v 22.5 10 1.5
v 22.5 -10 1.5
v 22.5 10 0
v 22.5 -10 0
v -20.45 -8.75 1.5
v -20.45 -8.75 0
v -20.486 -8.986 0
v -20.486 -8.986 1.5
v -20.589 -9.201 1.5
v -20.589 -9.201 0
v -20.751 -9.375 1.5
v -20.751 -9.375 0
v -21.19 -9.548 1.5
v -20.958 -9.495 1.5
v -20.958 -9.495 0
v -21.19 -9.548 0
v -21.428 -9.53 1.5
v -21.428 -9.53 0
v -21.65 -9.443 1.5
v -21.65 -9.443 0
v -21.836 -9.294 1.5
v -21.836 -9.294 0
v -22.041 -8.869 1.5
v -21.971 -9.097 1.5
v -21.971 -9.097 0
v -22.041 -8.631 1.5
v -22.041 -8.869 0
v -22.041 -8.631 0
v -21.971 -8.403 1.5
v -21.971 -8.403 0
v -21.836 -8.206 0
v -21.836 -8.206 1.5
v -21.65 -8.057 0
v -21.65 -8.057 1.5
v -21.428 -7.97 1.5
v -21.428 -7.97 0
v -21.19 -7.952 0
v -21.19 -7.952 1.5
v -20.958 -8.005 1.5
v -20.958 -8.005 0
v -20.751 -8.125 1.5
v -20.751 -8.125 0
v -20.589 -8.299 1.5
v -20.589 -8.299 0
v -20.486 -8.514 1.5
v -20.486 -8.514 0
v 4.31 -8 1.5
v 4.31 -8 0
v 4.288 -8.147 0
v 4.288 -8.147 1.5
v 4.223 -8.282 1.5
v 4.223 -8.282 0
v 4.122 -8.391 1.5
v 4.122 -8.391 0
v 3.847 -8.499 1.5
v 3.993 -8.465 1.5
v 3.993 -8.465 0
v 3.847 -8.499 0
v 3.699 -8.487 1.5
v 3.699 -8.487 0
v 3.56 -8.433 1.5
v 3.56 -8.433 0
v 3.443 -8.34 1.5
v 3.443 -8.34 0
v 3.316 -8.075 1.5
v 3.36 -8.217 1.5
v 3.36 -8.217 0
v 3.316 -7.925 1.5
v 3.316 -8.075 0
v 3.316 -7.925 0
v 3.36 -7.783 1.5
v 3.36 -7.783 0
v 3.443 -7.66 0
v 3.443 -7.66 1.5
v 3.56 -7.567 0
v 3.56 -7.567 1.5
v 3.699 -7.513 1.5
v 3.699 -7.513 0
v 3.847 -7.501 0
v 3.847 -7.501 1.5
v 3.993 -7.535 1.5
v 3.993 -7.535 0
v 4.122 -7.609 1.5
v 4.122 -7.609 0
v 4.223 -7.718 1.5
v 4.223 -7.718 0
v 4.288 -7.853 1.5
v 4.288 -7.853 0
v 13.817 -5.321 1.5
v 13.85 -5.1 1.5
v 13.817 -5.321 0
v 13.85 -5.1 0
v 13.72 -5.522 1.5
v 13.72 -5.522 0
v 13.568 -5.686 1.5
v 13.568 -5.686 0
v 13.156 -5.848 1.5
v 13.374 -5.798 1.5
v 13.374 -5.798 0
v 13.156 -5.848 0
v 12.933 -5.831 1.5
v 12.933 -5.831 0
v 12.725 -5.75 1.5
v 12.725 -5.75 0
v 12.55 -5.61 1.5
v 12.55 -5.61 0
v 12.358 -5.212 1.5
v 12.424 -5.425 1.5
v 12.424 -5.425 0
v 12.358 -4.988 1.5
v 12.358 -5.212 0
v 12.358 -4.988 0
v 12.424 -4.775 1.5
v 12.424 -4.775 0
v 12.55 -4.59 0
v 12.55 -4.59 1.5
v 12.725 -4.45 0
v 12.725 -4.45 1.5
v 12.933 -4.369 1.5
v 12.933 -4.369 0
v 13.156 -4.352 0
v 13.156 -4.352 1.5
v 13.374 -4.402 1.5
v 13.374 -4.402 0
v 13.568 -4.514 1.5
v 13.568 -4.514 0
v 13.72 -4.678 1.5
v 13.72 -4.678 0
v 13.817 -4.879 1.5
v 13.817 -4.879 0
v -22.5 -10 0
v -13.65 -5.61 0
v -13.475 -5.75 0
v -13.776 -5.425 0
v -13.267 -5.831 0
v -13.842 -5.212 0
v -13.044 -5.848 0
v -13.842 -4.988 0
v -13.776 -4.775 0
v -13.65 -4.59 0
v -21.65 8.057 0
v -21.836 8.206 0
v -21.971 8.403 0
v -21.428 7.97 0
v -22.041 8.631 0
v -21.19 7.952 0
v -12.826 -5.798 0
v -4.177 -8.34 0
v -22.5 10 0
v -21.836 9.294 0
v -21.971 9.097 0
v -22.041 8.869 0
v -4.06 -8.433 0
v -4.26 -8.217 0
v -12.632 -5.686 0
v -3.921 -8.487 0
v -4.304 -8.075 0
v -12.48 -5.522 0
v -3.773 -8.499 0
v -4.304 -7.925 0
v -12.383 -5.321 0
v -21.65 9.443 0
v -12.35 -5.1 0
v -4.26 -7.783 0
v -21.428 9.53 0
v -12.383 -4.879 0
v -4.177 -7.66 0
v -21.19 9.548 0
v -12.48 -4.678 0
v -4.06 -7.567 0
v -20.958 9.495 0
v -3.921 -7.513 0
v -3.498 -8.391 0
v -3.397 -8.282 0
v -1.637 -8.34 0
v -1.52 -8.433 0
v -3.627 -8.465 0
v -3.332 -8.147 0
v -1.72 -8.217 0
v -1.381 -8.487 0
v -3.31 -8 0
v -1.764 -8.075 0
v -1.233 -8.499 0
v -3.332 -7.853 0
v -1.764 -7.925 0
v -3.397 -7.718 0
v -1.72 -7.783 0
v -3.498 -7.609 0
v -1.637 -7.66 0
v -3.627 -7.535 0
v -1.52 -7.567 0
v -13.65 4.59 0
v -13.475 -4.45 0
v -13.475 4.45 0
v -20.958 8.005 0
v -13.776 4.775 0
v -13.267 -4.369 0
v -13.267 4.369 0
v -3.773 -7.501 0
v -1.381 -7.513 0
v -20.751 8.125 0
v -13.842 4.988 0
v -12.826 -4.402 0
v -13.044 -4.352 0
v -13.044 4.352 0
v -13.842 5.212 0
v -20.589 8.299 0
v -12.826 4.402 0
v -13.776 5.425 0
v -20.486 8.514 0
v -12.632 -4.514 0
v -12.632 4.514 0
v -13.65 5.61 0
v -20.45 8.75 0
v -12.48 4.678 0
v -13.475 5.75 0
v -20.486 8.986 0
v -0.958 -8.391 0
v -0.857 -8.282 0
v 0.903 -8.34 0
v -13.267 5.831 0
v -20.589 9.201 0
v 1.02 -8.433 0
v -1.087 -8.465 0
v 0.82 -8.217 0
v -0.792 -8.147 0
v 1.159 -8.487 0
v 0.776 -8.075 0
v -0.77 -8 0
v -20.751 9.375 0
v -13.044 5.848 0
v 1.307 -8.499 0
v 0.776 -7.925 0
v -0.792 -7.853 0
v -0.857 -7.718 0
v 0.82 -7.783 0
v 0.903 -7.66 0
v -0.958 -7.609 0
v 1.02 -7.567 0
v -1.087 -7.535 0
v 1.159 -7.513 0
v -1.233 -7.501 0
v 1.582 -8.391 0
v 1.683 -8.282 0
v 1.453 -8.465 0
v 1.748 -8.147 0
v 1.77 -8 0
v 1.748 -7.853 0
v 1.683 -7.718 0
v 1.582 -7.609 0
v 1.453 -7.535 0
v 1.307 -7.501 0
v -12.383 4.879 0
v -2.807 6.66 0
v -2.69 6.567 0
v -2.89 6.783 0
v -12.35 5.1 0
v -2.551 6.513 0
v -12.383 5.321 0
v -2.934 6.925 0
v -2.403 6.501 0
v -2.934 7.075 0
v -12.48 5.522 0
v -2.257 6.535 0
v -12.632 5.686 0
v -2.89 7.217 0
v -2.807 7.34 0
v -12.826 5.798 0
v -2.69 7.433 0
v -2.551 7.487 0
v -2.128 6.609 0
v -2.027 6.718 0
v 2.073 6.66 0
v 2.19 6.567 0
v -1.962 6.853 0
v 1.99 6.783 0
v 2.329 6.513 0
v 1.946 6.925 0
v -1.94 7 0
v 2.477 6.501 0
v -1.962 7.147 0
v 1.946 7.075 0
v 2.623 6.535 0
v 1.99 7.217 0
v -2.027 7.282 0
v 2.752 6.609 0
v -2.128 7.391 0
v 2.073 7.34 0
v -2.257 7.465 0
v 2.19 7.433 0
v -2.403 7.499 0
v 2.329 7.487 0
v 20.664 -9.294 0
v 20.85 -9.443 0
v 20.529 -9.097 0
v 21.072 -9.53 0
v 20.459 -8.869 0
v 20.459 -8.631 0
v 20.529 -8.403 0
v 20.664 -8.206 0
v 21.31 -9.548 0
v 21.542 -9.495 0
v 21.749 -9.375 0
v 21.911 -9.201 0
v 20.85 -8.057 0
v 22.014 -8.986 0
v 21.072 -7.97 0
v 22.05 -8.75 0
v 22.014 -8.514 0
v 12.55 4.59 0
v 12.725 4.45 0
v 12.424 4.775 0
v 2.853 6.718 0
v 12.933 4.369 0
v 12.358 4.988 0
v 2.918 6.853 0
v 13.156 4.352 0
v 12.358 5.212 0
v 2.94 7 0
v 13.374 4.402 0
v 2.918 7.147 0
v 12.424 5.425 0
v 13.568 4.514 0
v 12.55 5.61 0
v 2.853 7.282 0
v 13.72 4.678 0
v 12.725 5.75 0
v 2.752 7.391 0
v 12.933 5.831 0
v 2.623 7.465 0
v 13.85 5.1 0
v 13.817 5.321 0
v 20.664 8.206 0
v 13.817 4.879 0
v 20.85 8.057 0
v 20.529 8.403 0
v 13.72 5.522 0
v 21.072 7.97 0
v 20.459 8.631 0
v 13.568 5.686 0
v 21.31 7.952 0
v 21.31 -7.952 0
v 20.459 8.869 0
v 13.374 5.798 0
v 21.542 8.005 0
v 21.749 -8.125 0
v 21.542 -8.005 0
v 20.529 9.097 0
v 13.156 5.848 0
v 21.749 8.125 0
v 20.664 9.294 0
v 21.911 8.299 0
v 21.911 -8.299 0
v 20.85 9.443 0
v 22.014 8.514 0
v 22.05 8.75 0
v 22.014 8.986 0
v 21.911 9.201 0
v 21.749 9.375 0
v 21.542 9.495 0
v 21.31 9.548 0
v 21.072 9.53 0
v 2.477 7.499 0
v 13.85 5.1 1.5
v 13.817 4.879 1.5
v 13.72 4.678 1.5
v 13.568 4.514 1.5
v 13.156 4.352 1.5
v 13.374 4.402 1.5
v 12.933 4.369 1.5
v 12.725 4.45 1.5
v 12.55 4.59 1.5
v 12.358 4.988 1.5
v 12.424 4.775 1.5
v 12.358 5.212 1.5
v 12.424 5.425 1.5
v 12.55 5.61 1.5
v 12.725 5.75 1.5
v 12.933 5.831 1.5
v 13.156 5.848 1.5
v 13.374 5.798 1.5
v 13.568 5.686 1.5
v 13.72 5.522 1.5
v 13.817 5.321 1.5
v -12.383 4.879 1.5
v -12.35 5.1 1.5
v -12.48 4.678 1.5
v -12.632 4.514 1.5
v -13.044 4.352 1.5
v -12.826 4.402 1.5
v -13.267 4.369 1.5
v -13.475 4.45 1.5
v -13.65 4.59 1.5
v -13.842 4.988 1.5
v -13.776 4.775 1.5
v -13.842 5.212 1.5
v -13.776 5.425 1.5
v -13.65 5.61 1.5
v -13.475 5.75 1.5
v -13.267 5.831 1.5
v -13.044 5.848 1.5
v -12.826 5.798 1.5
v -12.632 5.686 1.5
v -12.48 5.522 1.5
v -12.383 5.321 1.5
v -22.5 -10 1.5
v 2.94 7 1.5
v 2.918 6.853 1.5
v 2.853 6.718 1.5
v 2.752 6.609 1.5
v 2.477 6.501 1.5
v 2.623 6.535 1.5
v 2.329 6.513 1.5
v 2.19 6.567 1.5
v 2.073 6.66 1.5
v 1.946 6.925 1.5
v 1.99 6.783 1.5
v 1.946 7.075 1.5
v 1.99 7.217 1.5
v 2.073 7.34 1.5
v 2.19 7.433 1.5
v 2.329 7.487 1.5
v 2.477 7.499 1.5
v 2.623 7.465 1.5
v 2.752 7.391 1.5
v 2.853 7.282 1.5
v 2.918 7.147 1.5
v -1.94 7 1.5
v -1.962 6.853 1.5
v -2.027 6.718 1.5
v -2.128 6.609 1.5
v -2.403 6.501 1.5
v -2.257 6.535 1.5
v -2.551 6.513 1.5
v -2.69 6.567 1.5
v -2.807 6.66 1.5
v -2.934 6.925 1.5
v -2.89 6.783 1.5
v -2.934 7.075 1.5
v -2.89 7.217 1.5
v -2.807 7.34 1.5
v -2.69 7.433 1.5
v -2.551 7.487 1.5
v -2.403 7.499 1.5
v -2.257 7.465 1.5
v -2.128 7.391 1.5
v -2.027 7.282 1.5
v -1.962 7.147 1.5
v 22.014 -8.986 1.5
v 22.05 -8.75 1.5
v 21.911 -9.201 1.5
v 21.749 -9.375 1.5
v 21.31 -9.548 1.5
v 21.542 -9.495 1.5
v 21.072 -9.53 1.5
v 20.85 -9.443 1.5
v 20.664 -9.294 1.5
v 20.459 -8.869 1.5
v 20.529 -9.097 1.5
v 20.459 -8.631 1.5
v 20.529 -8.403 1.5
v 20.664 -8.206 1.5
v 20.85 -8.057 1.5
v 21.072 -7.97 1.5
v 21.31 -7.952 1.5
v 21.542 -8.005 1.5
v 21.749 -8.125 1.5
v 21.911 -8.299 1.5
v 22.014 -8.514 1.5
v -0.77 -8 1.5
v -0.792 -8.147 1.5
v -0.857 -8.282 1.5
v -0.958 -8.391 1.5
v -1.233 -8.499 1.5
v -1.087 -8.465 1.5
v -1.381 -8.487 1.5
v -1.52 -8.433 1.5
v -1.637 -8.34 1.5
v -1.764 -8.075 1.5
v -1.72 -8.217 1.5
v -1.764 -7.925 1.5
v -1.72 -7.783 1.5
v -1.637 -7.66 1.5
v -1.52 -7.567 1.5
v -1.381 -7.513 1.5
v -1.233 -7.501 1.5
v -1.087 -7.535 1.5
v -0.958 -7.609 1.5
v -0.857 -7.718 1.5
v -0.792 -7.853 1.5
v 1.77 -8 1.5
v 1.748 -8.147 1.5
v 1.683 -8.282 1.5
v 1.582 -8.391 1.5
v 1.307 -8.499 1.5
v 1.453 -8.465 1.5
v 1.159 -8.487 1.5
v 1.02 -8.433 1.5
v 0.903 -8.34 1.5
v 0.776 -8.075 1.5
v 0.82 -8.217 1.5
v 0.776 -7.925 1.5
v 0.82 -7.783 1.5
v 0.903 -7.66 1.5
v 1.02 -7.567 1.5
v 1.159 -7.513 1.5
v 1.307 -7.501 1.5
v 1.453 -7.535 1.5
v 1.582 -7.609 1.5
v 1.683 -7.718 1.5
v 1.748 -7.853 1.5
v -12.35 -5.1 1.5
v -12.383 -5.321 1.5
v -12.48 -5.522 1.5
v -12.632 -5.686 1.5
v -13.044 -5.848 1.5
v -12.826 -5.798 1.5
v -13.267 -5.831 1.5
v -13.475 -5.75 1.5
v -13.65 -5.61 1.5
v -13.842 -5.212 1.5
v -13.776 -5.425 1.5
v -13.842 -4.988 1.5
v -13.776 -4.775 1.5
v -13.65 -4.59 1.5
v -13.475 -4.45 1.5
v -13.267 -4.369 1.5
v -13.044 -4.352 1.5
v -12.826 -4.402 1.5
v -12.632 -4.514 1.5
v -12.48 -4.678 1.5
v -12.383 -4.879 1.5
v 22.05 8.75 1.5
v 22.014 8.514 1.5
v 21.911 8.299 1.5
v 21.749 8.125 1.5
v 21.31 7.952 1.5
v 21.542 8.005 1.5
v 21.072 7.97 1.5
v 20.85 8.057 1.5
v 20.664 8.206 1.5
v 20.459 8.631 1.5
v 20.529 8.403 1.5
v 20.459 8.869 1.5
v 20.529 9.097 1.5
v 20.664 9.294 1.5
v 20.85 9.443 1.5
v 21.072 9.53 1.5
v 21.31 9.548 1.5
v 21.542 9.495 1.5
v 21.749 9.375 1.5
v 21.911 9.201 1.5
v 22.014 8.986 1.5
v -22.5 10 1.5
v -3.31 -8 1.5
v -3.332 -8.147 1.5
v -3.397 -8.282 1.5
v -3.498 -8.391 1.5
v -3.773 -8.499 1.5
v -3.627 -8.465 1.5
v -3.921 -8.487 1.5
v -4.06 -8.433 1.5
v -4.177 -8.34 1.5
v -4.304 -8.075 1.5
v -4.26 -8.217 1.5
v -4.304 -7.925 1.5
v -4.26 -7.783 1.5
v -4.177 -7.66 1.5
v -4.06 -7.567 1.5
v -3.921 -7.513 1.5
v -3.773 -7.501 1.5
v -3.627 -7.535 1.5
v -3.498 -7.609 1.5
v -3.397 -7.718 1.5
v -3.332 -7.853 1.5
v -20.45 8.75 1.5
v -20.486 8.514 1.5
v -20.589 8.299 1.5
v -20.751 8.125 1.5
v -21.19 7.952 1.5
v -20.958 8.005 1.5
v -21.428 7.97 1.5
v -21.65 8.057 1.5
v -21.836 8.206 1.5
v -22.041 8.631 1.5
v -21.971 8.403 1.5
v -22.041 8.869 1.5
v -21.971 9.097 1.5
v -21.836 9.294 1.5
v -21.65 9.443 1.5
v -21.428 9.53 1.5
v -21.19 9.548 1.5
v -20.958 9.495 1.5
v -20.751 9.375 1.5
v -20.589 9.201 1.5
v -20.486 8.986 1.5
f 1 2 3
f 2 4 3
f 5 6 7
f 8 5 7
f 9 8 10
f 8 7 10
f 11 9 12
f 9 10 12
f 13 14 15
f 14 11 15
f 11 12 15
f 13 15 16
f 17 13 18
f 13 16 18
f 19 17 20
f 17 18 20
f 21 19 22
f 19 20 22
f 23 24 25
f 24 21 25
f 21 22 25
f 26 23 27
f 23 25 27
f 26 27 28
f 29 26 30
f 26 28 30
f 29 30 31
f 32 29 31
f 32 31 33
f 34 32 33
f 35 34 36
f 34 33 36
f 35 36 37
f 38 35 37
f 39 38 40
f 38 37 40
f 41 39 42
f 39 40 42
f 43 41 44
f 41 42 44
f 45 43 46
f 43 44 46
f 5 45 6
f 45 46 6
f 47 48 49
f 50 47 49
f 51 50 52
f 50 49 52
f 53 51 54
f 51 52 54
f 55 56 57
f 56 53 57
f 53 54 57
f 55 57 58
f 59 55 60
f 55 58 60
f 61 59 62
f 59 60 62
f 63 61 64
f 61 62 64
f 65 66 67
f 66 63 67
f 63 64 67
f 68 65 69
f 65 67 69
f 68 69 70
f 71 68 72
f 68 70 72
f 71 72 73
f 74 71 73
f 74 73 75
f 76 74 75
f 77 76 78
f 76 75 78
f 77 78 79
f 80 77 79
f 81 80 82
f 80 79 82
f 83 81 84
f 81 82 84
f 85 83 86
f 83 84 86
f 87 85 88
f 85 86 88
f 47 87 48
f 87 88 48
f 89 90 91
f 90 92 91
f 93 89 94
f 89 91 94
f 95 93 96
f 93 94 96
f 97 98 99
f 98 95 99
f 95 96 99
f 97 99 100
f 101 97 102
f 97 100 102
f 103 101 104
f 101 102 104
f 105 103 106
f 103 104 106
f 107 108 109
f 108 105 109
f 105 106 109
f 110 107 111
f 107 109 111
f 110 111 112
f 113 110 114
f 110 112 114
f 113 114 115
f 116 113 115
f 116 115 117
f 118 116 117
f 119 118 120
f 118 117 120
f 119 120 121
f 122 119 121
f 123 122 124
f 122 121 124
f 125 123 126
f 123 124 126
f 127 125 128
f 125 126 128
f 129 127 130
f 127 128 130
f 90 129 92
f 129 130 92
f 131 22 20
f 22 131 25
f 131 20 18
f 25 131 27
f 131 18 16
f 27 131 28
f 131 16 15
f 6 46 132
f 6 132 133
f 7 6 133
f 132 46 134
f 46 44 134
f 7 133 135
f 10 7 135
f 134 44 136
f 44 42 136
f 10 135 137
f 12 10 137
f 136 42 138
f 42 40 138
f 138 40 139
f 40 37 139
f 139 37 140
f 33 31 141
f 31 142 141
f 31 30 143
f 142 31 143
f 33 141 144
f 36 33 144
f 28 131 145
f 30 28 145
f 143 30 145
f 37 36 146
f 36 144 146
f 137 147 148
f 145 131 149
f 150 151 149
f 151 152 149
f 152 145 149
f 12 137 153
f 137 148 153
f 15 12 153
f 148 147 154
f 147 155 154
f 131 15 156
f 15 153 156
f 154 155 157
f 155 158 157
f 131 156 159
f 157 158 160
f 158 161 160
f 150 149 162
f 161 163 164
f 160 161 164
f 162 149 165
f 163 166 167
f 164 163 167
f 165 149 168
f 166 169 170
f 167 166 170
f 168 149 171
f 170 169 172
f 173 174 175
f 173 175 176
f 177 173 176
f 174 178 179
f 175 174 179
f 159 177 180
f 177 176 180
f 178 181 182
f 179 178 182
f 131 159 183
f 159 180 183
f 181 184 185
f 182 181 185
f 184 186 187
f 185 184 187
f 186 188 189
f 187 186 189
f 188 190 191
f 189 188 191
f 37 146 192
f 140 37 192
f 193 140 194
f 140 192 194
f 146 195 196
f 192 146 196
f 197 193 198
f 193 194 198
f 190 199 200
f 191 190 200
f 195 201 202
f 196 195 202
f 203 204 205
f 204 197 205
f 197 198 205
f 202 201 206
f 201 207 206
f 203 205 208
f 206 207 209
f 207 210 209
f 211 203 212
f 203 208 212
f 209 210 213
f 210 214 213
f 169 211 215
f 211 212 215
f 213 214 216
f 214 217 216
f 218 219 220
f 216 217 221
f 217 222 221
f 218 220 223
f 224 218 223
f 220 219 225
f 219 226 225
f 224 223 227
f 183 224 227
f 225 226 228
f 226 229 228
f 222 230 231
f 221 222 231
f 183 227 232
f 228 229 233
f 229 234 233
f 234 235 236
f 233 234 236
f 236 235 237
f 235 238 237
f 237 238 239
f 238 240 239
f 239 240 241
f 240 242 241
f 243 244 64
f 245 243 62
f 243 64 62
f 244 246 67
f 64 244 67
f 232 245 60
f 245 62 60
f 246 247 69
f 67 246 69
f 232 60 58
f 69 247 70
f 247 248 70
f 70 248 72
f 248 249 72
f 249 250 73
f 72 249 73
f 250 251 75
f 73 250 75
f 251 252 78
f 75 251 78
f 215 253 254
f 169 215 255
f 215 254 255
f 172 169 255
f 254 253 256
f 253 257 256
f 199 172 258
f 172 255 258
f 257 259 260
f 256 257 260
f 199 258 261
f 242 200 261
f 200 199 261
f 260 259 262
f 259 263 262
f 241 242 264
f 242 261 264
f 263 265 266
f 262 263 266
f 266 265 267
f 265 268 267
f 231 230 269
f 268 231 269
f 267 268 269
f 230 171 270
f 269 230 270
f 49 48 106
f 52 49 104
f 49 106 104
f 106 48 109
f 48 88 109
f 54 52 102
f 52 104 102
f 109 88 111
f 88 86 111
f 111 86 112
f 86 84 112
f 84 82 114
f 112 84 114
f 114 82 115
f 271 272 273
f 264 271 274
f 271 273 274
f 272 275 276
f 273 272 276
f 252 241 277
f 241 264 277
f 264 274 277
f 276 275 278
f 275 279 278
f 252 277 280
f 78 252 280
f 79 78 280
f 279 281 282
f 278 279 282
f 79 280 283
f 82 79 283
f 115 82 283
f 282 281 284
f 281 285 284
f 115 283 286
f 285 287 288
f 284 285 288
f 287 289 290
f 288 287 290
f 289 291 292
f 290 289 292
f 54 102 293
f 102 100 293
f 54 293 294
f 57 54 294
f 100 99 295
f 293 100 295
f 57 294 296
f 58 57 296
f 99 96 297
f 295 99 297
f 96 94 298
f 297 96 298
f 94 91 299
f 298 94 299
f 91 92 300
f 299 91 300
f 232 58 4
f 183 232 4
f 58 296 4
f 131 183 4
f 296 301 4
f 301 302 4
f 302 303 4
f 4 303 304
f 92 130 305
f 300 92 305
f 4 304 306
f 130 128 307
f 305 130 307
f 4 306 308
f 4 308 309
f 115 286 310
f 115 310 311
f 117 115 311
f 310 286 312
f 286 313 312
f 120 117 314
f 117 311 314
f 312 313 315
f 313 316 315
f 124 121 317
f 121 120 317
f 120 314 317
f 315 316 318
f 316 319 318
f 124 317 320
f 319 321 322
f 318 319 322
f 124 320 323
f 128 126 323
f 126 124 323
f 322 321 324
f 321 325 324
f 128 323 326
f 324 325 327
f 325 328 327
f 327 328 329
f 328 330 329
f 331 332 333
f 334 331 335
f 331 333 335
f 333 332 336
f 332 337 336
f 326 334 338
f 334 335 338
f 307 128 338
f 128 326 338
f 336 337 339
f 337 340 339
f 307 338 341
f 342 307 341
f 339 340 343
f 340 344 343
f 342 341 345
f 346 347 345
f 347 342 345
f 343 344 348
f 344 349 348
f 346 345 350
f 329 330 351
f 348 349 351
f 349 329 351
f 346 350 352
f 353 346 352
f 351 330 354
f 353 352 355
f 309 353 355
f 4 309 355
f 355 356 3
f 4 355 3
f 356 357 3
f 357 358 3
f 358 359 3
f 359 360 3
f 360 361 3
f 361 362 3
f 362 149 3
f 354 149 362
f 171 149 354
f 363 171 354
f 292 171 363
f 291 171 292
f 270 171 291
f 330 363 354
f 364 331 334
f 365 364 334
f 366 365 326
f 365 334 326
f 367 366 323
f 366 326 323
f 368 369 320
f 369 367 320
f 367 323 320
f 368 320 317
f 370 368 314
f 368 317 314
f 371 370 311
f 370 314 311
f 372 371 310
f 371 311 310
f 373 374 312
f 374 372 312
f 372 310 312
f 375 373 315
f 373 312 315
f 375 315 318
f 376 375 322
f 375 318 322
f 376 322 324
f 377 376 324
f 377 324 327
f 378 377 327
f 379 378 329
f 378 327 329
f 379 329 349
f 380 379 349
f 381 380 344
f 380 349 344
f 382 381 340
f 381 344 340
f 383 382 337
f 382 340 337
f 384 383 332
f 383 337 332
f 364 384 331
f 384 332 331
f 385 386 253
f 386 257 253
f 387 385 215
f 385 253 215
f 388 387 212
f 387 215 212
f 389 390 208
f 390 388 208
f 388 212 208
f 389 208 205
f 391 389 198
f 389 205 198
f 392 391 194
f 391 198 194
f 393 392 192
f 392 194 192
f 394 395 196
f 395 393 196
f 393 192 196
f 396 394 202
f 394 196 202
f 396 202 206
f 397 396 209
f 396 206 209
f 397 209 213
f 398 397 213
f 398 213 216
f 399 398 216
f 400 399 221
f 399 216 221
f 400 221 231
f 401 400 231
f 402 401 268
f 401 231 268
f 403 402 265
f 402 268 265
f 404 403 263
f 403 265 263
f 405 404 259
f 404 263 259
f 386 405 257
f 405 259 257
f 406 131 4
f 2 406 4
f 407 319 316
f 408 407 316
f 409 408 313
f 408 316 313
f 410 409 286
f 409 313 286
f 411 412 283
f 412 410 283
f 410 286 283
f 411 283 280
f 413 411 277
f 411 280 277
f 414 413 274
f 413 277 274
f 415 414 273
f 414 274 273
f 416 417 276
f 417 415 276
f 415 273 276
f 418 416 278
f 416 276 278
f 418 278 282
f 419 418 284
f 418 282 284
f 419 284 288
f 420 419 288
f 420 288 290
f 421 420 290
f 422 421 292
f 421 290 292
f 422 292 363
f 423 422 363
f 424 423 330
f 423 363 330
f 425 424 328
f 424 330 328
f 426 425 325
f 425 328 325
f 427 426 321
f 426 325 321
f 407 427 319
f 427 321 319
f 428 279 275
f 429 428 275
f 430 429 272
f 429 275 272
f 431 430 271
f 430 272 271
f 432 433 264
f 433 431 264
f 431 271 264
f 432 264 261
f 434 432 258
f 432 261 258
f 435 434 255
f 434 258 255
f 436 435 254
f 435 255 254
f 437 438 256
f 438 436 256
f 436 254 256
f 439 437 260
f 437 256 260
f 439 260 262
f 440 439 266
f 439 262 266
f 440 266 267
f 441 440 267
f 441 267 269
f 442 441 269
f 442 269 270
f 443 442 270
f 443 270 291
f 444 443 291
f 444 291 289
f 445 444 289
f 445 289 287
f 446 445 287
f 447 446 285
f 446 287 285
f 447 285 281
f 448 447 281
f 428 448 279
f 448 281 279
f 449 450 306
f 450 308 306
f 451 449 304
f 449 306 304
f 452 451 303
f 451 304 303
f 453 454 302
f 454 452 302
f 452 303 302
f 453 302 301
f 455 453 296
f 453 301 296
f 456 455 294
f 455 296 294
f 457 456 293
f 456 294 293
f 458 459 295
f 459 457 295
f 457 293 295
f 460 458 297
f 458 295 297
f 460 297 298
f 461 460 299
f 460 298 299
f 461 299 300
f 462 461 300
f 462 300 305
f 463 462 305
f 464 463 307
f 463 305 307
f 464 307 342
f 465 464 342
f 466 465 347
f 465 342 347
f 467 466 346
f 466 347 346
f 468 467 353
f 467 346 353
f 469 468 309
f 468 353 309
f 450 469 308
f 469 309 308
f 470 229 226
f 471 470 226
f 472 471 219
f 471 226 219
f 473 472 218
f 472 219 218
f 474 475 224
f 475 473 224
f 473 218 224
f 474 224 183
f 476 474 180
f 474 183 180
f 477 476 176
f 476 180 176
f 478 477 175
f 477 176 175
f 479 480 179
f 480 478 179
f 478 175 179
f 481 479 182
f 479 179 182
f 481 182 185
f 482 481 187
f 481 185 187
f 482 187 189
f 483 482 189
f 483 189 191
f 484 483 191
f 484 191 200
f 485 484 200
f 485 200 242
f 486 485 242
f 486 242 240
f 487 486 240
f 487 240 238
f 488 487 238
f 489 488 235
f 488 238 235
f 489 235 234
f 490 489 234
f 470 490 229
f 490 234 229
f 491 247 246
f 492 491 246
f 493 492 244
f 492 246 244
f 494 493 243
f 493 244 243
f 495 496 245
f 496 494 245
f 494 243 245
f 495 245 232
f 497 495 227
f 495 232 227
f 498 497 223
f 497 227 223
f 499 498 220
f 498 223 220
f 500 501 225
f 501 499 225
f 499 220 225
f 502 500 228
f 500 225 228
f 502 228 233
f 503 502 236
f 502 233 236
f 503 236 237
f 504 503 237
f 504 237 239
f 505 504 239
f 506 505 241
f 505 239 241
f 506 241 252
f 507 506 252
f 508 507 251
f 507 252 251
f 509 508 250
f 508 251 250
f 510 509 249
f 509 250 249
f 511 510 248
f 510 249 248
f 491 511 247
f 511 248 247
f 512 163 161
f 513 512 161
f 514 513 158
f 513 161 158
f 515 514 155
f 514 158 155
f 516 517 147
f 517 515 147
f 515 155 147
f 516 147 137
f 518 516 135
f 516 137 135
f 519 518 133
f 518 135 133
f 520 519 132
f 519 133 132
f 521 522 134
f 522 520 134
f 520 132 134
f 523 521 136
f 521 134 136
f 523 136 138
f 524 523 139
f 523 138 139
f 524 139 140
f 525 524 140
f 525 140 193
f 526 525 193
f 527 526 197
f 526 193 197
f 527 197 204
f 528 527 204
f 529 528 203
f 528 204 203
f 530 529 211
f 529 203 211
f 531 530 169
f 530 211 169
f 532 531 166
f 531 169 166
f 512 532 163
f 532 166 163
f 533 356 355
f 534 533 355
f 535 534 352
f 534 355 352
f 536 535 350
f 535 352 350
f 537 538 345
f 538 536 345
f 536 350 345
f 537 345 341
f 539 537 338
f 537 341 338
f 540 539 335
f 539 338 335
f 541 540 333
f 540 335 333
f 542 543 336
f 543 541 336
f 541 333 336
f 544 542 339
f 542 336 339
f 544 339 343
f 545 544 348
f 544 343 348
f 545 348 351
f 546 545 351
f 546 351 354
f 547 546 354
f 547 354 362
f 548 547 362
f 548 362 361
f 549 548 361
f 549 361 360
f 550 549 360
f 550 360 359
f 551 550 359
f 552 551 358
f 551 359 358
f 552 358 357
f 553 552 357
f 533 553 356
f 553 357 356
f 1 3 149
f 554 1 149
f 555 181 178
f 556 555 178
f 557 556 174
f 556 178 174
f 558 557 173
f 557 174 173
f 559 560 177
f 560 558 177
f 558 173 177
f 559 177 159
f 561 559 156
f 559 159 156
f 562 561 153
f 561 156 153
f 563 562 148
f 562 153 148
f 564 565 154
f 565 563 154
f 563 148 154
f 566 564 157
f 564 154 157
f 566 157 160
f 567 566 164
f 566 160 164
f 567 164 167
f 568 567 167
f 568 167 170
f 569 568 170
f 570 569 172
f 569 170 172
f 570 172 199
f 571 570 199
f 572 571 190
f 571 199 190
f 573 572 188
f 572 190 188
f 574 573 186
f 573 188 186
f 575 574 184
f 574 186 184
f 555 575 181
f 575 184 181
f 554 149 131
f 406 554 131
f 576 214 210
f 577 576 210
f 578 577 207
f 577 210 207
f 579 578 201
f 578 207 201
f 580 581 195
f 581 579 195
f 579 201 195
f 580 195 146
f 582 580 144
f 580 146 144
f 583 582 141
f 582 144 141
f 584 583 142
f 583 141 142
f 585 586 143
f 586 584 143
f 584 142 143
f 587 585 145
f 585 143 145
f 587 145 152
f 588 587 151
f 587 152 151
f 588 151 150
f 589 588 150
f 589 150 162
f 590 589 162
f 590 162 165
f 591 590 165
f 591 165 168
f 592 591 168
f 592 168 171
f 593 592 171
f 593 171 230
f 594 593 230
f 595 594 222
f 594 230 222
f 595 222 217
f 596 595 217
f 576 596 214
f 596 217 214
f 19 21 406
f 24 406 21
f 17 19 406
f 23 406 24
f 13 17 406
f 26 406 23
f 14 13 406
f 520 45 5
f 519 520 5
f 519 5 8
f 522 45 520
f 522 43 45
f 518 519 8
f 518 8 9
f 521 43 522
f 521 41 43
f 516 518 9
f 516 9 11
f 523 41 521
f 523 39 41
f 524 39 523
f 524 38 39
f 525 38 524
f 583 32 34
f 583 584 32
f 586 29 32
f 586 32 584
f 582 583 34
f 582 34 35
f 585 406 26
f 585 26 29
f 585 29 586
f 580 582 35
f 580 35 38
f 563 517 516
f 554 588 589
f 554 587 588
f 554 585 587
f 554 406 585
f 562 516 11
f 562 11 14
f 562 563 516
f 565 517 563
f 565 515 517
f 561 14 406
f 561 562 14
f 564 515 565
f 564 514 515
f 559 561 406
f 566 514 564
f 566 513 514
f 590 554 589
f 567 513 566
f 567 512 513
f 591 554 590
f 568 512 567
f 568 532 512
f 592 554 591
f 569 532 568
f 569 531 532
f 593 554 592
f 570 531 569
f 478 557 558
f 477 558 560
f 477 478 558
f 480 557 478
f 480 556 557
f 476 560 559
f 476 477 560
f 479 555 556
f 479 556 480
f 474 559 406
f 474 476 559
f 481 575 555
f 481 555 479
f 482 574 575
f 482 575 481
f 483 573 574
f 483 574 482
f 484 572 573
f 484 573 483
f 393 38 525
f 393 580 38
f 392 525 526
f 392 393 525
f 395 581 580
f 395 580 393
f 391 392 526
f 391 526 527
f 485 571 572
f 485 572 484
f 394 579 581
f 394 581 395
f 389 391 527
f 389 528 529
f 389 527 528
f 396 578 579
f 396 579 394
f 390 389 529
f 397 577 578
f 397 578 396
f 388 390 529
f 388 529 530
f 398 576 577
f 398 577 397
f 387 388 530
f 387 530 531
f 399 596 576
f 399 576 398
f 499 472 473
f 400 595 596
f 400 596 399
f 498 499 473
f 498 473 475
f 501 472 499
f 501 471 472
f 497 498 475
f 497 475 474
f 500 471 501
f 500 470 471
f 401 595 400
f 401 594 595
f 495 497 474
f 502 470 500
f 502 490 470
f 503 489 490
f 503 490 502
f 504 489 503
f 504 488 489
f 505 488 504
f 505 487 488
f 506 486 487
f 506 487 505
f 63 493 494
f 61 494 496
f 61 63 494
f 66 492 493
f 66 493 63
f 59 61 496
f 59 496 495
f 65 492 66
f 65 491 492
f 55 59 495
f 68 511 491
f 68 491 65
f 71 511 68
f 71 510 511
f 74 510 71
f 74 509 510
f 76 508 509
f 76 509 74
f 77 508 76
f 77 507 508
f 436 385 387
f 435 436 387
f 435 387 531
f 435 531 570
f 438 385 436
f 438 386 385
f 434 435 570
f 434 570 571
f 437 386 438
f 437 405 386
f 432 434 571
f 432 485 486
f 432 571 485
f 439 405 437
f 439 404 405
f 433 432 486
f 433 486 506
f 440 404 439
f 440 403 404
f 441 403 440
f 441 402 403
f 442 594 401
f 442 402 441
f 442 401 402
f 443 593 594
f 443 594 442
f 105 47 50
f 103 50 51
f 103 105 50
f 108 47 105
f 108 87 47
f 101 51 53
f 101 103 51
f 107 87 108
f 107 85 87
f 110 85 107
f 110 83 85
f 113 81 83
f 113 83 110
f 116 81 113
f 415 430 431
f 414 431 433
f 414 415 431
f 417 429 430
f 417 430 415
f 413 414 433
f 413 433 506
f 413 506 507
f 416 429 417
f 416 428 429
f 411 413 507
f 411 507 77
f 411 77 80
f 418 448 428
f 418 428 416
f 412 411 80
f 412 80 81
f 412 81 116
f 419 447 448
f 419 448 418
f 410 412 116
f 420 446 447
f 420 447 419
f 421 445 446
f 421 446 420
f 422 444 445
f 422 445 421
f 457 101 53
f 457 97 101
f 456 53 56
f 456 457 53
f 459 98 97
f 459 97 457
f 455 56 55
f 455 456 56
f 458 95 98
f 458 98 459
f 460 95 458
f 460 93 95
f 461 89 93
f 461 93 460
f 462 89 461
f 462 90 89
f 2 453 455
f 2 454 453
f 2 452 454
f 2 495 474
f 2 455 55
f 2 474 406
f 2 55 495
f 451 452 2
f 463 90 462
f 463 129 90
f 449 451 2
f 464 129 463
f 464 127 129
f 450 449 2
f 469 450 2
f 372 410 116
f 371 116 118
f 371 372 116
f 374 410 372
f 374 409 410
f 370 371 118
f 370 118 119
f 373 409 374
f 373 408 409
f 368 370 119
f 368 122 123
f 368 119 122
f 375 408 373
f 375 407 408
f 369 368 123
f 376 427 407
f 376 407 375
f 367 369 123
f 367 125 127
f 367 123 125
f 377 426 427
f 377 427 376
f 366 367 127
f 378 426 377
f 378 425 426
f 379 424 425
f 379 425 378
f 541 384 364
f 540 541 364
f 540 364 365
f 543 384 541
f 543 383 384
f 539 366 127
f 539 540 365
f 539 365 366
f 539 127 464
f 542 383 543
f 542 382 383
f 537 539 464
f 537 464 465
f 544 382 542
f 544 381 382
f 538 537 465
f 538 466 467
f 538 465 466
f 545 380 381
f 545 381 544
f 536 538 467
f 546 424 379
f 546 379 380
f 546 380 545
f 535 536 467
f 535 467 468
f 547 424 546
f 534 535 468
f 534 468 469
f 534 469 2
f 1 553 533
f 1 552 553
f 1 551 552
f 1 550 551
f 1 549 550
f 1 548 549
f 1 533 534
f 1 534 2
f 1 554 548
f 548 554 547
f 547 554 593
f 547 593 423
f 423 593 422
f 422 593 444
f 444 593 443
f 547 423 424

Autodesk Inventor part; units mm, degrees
ref_plane "YZ Plane" through (0, 0, 0) normal (1, 0, 0) x (0, 1, 0)
ref_plane "XZ Plane" through (0, 0, 0) normal (0, 1, 0) x (-1, 0, 0)
ref_plane "XY Plane" through (0, 0, 0) normal (0, 0, 1) x (1, 0, 0)
sketch "board" plane through (0, 0, 0) normal (0, 0, 1) x (1, 0, 0)
  line L0 (22.5, 10) -> (-22.5, 10)
  line L1 (-22.5, 10) -> (-22.5, -10)
  line L2 (-22.5, -10) -> (22.5, -10)
  line L3 (22.5, -10) -> (22.5, 10)
  line L4 (22.5, 10) -> (-22.5, -10) construction
  line L5 (-22.5, 10) -> (22.5, -10) construction
  circle A0 centre (-3.81, -8) radius 0.5
  circle A1 centre (-21.25, 8.75) radius 0.8
  circle A2 centre (21.25, 8.75) radius 0.8
  circle A3 centre (-21.25, -8.75) radius 0.8
  circle A4 centre (21.25, -8.75) radius 0.8
  circle A5 centre (-1.27, -8) radius 0.5
  circle A6 centre (1.27, -8) radius 0.5
  circle A7 centre (3.81, -8) radius 0.5
  circle A8 centre (-2.44, 7) radius 0.5
  circle A9 centre (2.44, 7) radius 0.5
  circle A10 centre (-13.1, 5.1) radius 0.75
  circle A11 centre (13.1, 5.1) radius 0.75
  circle A12 centre (-13.1, -5.1) radius 0.75
  circle A13 centre (13.1, -5.1) radius 0.75
  point P0 (0, 0)
  point P1 (0, 0)
  point P2 (13.2529, 5)
  dimension "d34" = 45
  dimension "d35" = 20
  dimension "d39" = 1
  dimension "d44" = 1.6
  dimension "d48" = 1.25
  dimension "d51" = 42.5
  dimension "d54" = 17.5
  dimension "d57" = 1.25
  dimension "d60" = 2.54
  dimension "d65" = 3.81
  dimension "d66" = 2
  dimension "d67" = 4.88
  dimension "d68" = 2.44
  dimension "d69" = 1
  dimension "d70" = 1
  dimension "d71" = 3
  dimension "d72" = 1.5
  dimension "d75" = 26.2
  dimension "d78" = 10.2
  dimension "d81" = 5.1
  dimension "d82" = 13.1
extrude "Extrusion2" add sketch "board" along normal blind 1.5
equation "\"d68\" = 0.5 * d67"
equation "\"d70\" = d69"
equation "\"d81\" = 0.5 * d78"
equation "\"d82\" = 0.5 * d75"
properties part number "Board"
